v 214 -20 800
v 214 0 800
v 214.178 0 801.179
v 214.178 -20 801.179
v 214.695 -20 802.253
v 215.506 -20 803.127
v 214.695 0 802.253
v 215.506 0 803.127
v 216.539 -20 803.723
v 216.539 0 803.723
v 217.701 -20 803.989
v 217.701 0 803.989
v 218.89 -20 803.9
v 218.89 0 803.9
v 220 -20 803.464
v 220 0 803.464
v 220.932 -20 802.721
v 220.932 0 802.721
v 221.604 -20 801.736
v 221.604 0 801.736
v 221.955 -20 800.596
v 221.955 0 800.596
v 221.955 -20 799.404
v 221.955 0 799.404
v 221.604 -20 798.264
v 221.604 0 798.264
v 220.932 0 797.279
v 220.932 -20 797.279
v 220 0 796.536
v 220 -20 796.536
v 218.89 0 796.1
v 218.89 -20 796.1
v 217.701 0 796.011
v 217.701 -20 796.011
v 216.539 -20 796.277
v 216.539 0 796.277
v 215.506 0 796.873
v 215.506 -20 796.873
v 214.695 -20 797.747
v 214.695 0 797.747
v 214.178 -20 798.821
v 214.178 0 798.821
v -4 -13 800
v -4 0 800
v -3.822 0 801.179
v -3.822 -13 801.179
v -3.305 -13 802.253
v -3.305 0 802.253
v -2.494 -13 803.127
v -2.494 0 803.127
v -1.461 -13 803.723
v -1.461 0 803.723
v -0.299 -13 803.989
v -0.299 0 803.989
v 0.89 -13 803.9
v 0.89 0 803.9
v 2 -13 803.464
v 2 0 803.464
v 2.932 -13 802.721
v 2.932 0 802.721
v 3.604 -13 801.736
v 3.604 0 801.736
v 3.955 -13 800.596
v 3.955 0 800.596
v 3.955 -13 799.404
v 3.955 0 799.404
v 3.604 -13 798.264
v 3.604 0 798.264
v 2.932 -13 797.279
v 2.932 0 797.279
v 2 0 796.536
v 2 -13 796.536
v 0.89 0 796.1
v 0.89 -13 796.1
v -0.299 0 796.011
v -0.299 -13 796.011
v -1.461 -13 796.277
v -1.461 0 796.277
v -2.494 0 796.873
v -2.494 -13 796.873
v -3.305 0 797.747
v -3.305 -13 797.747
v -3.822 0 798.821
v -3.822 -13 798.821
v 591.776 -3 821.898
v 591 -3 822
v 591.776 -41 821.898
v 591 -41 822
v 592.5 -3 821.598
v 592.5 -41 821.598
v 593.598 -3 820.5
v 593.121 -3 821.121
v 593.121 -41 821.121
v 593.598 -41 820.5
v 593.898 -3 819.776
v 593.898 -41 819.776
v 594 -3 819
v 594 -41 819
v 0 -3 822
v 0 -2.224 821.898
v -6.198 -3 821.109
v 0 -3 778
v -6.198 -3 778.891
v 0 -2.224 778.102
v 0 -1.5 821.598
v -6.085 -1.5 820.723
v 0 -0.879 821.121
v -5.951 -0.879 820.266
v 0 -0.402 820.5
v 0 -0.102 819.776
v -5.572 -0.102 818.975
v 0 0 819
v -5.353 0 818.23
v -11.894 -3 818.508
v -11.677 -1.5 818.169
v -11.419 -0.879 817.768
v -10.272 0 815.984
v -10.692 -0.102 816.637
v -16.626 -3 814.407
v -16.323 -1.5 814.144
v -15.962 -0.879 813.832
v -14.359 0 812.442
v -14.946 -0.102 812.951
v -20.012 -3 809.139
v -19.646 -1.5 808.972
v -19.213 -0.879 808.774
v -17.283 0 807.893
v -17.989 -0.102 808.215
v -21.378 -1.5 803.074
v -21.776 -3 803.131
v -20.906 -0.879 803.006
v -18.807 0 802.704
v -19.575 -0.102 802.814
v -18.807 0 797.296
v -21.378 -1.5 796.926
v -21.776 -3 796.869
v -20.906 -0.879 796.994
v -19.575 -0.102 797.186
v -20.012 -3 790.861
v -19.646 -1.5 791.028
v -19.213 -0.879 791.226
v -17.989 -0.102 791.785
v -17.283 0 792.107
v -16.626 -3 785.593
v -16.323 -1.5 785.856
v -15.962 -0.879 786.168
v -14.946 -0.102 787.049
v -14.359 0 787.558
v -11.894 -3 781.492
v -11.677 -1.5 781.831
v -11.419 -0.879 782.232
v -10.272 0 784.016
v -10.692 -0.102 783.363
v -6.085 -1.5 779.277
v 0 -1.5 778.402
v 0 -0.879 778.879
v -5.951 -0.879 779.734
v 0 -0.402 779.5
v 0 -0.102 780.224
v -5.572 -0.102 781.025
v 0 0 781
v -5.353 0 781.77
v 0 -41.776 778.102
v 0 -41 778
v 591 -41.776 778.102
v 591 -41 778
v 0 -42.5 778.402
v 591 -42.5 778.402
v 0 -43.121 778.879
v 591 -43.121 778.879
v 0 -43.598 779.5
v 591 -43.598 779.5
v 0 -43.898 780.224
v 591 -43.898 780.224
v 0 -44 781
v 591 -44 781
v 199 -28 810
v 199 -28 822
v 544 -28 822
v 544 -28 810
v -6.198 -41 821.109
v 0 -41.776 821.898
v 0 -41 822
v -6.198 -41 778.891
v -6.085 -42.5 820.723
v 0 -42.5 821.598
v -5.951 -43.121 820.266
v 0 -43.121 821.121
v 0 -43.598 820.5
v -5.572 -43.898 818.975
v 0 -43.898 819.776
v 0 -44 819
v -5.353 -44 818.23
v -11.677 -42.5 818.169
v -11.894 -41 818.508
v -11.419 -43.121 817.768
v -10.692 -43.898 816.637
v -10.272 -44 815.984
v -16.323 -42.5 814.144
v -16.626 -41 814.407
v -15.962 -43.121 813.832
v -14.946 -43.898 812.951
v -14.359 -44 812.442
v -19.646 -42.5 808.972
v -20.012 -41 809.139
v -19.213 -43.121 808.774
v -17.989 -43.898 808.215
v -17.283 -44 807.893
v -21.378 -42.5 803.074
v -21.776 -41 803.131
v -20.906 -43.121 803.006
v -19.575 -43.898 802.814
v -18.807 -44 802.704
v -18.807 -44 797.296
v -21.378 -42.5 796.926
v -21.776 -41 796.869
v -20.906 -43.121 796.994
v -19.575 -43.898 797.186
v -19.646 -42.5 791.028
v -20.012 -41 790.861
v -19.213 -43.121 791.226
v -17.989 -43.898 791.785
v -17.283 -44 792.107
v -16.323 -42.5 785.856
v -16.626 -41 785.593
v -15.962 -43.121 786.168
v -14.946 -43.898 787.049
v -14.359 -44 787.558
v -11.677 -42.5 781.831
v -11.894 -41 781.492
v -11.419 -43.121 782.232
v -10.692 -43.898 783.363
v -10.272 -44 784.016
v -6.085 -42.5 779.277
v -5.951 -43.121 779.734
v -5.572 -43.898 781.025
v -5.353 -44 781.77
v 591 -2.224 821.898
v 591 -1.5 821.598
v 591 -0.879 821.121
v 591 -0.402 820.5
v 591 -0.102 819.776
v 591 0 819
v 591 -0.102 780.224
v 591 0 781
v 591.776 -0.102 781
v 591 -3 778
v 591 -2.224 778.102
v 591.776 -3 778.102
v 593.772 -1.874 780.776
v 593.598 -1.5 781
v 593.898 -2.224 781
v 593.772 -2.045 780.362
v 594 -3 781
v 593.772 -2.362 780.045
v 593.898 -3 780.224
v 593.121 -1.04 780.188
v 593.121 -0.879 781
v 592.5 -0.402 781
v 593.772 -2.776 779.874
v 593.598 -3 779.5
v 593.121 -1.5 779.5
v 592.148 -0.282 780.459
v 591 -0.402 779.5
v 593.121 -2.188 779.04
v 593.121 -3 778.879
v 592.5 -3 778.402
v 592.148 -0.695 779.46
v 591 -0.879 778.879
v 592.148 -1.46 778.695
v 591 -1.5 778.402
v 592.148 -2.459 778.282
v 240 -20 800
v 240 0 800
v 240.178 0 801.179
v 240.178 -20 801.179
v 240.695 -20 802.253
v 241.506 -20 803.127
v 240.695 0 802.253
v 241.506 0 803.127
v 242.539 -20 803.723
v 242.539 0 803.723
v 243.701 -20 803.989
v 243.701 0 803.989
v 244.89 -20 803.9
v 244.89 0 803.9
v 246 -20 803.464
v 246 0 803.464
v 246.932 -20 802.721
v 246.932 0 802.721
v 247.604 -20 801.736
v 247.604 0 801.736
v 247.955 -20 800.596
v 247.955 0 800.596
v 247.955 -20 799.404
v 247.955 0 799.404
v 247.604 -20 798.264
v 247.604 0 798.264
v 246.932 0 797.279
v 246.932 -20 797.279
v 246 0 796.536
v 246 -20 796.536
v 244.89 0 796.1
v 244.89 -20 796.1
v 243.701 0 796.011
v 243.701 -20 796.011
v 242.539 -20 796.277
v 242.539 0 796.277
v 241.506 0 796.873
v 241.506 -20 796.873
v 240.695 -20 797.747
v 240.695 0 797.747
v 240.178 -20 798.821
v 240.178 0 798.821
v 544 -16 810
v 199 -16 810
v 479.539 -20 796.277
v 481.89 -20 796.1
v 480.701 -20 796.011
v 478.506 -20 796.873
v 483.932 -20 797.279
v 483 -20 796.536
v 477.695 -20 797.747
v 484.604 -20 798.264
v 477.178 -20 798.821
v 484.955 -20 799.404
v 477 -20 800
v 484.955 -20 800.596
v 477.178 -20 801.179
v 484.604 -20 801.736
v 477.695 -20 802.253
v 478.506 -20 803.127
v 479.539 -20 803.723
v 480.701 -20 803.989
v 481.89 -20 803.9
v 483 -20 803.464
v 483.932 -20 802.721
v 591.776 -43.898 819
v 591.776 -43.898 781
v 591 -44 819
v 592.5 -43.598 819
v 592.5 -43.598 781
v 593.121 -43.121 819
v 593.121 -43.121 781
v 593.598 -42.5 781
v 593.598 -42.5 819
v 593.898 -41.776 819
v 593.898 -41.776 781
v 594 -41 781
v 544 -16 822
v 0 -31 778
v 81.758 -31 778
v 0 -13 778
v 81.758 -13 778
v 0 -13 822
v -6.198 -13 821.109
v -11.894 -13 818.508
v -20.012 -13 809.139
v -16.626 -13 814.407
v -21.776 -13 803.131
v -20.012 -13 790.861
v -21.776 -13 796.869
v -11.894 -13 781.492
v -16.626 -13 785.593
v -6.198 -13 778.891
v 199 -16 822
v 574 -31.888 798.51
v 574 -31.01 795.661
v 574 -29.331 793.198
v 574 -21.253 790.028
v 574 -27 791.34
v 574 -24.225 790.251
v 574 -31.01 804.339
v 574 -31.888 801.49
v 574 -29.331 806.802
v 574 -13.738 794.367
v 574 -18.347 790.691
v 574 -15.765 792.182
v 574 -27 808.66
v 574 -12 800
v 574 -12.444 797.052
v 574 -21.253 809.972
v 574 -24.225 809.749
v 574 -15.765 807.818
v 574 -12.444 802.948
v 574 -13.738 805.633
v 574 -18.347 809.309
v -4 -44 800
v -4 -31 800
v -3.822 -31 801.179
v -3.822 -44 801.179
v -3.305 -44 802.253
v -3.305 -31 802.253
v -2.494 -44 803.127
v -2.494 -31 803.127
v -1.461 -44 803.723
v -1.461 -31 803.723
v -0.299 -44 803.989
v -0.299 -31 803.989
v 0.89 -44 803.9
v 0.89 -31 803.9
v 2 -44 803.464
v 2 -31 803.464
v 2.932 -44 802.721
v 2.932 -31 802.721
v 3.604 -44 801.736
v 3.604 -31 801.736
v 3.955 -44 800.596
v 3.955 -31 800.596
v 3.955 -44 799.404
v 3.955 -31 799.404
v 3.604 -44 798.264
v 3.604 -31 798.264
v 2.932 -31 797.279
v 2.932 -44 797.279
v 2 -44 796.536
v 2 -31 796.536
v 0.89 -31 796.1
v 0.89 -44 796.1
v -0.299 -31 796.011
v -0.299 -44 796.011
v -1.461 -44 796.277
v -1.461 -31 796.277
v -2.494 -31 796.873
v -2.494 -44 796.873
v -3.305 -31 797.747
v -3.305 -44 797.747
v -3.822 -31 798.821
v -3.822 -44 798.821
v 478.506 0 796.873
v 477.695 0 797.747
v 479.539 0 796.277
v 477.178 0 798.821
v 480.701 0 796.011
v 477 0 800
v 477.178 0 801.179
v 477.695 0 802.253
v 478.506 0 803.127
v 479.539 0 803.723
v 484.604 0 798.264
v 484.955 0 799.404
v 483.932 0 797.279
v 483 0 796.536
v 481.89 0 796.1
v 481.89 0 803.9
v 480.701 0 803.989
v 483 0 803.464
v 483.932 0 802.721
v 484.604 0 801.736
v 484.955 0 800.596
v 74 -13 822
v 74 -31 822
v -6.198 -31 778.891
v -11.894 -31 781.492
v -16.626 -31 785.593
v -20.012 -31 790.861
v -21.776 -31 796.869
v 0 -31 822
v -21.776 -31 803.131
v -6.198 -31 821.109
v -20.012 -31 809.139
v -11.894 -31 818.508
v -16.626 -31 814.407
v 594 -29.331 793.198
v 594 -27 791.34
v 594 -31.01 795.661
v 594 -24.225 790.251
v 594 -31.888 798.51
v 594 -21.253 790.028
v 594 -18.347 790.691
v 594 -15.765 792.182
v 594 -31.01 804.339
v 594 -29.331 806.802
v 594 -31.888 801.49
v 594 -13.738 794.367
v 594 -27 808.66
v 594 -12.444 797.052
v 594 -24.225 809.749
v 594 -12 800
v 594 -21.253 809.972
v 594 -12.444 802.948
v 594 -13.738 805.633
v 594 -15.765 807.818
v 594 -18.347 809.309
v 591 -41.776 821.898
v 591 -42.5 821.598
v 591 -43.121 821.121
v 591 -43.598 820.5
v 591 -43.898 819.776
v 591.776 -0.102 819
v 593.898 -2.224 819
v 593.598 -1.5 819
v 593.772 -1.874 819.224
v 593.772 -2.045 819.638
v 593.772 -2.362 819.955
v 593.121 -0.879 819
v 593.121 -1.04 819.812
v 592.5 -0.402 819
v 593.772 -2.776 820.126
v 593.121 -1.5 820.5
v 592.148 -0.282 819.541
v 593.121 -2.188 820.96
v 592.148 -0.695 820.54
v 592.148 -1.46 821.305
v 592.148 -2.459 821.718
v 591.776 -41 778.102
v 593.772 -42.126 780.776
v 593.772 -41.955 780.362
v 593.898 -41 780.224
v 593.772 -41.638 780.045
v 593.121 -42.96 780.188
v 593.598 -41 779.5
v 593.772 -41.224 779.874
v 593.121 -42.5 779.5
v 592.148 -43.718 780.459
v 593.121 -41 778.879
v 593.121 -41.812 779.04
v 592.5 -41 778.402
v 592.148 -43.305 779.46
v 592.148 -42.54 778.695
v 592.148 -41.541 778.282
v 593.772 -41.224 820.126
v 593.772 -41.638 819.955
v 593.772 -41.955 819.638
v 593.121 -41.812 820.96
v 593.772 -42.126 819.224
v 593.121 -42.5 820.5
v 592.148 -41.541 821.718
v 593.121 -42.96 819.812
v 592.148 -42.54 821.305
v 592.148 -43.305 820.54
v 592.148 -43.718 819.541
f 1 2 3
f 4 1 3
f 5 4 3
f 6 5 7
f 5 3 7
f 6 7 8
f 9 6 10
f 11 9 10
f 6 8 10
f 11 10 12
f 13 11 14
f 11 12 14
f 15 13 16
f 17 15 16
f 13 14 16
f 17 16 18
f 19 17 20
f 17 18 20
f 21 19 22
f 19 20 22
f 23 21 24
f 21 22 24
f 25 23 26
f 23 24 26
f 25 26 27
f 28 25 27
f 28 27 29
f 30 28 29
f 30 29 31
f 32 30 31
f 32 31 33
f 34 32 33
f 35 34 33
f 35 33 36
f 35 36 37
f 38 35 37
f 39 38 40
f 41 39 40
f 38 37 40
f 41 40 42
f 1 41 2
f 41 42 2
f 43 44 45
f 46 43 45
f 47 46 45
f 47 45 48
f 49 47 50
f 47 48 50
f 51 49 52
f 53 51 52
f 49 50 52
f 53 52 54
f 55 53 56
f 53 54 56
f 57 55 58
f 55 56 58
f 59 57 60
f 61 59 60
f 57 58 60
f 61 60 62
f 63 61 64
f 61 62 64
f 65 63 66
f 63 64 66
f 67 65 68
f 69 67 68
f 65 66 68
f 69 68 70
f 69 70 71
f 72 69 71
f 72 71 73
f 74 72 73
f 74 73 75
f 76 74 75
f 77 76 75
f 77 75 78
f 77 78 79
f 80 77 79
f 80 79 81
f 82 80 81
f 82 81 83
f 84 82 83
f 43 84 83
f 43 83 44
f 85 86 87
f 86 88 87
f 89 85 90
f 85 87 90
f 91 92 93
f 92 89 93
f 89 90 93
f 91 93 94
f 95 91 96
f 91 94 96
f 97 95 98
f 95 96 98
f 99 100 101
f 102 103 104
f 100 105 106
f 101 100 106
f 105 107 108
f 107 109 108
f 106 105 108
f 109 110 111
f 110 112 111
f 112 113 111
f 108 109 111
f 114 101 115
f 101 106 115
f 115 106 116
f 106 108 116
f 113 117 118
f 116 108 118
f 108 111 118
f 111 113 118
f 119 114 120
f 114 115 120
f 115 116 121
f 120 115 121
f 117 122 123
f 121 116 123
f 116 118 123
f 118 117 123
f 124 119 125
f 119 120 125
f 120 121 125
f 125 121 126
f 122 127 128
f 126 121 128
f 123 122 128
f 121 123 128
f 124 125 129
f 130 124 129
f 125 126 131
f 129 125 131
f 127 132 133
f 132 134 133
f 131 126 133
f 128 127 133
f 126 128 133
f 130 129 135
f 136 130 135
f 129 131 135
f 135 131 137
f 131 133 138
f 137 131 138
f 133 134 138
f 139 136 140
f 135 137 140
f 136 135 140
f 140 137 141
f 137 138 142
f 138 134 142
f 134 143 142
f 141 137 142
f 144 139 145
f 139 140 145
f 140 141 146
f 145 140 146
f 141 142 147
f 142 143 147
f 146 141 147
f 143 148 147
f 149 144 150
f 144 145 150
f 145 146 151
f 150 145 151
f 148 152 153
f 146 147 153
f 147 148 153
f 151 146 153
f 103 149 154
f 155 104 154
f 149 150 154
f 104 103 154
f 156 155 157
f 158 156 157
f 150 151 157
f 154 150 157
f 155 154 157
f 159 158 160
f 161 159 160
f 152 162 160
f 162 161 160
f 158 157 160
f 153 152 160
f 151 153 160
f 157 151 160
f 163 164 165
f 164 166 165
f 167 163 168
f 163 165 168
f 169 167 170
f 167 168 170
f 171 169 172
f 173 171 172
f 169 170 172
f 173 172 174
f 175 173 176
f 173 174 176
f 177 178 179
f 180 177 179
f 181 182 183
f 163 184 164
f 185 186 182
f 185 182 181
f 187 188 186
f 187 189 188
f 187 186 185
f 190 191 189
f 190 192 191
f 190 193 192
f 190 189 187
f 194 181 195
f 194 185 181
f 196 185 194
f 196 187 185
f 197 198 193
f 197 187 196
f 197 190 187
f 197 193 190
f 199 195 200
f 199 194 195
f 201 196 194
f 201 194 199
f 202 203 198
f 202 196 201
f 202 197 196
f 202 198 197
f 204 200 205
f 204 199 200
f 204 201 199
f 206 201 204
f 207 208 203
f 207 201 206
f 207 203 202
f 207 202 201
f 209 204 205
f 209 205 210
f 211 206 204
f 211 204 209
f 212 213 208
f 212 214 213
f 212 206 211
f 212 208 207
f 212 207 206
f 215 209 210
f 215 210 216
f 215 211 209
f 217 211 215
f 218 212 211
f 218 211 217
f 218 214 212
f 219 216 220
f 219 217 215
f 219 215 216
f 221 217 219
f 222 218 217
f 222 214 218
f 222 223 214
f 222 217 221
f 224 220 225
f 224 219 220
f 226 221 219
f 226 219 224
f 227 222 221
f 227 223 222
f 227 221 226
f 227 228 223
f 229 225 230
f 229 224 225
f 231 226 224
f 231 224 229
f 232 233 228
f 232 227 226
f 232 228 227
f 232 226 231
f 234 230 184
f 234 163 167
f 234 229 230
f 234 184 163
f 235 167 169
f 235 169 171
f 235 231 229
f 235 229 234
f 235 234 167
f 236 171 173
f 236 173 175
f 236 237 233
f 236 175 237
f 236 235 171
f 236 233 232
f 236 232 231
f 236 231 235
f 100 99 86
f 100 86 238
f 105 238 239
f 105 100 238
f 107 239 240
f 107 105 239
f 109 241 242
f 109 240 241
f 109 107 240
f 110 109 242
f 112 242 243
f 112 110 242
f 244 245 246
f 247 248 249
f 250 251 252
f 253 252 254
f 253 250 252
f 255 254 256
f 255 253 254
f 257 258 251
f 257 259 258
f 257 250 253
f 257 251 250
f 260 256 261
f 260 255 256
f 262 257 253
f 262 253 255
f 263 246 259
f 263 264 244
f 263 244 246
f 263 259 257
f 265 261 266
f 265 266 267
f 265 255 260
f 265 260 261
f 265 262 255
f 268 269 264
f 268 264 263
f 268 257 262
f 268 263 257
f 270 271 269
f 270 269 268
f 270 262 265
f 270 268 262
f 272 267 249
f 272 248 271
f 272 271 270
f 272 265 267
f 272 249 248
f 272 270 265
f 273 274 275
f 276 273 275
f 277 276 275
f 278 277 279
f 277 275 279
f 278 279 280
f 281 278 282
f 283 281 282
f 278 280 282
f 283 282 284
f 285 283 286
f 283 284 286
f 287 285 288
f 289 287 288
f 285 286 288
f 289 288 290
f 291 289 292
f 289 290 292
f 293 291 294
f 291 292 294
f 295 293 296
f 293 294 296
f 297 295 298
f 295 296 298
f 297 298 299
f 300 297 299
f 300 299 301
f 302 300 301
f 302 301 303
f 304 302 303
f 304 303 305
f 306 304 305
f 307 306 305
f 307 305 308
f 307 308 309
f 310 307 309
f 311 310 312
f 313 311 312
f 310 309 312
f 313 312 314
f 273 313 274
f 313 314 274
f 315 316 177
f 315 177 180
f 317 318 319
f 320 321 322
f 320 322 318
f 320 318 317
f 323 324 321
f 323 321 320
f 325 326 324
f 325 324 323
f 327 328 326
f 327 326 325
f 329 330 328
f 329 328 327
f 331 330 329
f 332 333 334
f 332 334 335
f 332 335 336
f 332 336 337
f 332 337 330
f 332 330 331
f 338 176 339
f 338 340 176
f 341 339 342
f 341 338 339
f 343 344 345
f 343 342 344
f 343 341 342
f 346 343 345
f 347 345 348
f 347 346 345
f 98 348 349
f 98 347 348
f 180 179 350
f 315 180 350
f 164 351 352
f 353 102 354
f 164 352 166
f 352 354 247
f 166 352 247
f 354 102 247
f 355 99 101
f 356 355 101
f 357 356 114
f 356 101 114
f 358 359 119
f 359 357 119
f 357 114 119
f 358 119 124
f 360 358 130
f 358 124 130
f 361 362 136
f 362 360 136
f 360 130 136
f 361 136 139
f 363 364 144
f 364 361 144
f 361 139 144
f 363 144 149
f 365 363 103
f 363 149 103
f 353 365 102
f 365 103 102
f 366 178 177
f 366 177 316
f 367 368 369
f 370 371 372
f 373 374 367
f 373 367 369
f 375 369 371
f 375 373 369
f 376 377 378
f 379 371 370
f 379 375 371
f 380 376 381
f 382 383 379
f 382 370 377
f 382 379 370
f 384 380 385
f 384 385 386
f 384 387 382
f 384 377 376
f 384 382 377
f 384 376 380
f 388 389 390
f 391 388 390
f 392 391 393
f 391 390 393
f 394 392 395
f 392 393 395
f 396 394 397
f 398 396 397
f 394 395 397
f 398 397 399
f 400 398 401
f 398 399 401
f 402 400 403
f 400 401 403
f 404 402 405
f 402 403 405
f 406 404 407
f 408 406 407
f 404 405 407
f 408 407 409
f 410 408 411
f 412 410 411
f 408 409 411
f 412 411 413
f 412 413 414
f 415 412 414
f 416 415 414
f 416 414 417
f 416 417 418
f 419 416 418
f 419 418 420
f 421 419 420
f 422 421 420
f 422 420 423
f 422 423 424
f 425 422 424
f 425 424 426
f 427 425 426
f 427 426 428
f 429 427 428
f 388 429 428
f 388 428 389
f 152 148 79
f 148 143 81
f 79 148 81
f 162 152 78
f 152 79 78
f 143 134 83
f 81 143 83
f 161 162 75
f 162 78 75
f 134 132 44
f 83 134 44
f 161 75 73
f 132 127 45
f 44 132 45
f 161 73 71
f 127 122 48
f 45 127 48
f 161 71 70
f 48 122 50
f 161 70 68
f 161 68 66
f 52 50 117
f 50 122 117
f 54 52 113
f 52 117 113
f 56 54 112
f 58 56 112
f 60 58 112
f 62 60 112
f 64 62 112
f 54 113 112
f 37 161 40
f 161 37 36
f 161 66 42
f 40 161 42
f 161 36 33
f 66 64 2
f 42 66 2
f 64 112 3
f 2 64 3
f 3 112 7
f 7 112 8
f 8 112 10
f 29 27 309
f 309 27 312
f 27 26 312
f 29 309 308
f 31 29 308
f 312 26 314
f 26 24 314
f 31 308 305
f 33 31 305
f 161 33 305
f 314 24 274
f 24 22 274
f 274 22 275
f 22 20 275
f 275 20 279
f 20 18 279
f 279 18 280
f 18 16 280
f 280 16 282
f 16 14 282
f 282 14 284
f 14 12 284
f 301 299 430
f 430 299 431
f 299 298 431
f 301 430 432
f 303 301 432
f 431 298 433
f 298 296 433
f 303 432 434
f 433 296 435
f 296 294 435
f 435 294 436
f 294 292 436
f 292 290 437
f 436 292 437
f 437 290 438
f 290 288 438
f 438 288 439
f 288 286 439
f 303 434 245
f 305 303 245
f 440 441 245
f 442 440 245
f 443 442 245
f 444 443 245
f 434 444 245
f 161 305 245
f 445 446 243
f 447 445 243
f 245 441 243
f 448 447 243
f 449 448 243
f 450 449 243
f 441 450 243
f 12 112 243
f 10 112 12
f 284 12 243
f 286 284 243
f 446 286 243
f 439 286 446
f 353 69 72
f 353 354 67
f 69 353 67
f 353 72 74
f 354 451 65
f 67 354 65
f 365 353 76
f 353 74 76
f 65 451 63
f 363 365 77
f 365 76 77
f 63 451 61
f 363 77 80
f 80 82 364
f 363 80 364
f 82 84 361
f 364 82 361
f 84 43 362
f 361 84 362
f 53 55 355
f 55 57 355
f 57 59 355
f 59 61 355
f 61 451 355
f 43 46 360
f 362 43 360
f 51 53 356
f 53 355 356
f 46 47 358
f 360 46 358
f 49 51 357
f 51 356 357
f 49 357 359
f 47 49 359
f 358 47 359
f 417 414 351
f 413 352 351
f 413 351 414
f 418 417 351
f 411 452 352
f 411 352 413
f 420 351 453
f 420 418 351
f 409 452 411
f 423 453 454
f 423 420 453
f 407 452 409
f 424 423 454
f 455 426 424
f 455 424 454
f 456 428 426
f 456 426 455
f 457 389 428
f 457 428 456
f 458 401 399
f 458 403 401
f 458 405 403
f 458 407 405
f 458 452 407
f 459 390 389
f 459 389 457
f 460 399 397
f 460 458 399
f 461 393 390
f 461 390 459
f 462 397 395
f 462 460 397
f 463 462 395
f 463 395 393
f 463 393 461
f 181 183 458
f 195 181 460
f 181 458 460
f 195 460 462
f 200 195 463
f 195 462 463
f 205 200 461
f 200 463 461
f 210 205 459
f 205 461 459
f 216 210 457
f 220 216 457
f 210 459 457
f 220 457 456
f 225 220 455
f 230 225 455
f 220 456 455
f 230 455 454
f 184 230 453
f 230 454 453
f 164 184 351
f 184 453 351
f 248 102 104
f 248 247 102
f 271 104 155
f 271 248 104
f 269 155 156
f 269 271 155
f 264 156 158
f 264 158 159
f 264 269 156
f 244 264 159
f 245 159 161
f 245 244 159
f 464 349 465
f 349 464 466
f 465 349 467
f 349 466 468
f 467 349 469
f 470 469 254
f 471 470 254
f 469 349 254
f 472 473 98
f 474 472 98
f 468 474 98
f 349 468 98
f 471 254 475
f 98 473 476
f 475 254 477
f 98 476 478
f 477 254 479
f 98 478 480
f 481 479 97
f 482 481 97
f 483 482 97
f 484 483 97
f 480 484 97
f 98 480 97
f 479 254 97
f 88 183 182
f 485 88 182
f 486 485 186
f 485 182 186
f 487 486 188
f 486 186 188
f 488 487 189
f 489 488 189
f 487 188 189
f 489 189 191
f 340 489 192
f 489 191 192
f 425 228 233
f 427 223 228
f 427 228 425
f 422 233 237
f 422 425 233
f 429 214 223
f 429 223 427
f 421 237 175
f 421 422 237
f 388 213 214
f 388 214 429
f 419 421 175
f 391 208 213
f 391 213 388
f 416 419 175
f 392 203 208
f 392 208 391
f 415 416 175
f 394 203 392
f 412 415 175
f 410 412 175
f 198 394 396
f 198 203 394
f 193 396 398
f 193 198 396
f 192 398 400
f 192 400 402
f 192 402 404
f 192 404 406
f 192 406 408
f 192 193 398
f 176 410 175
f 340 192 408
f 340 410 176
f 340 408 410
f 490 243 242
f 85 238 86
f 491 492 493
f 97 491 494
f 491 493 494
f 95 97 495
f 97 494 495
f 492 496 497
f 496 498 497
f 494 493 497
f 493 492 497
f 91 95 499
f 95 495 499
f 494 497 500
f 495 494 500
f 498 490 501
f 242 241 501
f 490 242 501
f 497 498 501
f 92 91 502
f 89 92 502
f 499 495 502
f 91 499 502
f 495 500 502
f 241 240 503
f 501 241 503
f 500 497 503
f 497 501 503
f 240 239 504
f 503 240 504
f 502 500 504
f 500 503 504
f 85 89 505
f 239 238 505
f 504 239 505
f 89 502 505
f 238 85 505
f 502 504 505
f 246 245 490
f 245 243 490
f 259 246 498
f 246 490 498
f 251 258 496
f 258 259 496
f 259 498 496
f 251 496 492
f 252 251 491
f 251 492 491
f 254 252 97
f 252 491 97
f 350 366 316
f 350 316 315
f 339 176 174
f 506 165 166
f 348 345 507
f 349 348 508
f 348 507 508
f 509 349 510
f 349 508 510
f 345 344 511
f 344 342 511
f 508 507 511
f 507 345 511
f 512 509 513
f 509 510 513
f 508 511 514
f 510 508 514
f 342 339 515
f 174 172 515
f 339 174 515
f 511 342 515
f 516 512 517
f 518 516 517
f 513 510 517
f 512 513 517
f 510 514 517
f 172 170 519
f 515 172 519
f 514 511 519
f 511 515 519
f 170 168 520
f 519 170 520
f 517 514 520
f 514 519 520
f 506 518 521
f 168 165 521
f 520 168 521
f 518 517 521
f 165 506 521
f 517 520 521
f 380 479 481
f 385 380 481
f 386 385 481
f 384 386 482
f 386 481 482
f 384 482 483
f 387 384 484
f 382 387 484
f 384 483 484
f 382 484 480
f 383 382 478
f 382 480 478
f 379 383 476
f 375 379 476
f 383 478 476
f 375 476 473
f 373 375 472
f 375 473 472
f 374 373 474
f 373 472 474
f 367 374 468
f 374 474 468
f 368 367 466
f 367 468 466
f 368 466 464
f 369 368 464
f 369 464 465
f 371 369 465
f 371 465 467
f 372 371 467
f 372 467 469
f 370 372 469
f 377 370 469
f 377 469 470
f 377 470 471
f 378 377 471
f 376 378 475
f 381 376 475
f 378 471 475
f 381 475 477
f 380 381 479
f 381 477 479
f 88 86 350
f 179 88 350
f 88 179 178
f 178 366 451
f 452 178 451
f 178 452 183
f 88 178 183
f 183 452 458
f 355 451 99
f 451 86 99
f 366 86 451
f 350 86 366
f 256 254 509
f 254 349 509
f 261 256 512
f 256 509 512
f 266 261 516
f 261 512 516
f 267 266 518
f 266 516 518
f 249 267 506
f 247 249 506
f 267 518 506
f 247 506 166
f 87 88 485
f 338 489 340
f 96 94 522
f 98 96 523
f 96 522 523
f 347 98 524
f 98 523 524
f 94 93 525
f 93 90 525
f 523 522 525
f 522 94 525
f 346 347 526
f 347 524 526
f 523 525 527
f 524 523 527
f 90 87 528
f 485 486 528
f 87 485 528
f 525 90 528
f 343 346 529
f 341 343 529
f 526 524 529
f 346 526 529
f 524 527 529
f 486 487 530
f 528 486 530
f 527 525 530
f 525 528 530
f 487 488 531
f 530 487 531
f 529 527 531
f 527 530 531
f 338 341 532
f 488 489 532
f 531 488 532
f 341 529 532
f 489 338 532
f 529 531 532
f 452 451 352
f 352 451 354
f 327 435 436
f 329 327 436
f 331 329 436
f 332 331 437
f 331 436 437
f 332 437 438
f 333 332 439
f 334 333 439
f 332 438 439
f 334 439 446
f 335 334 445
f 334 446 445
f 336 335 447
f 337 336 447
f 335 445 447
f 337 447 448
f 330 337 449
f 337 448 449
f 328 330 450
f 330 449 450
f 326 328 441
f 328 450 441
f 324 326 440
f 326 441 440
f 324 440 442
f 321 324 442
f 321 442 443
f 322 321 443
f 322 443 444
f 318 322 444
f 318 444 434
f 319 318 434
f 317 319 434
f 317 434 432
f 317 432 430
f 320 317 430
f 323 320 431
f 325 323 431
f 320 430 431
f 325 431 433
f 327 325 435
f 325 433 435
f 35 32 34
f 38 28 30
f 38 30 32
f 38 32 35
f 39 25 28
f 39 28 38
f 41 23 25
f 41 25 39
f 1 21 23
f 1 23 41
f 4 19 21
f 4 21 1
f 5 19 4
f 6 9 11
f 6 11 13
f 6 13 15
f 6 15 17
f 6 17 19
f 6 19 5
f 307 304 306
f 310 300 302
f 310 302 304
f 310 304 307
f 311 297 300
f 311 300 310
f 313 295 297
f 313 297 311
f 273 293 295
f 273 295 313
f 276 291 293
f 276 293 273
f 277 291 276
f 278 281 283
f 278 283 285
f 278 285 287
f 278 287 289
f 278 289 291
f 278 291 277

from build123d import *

# Parameters (mm, degrees)
F1_DEPTH  = 44
F4_DEPTH  = 18
F5_R      = 4
F6_DEPTH  = 44.001
F7_DEPTH  = 20
F8_R      = 10
F9_DEPTH  = 20
F10_R     = 3
F11_W     = 345
F11_H     = 12
F12_DEPTH = 12


with BuildPart() as f1:
    # F0 (on Front) → F1 (new body)
    with BuildSketch(Plane.XZ):
        with BuildLine():
            Line((594, 822), (0, 822))
            ThreePointArc((0, 822), (-22, 800), (0, 778))
            Line((0, 778), (594, 778))
            Line((594, 778), (594, 822))
        make_face()
    extrude(amount=F1_DEPTH)

    # F3 (on offset) → F4 (cut)
    with BuildSketch(Plane(origin=(0, -13, 0), x_dir=(-1, 0, 0), z_dir=(0, 1, 0))):
        Polygon((-81.7583871512, 778), (22, 778), (22, 822), (-74, 822), align=None)
    extrude(amount=-F4_DEPTH, mode=Mode.SUBTRACT)

    # F5 (on face) → F6 (cut, through all)
    with BuildSketch(Plane(origin=(0, 0, 0), x_dir=(-1, 0, 0), z_dir=(0, 1, 0))):
        with Locations((0, 800)):
            Circle(F5_R)
    extrude(amount=-F6_DEPTH, mode=Mode.SUBTRACT)

    # F5 (on face) → F7 (cut)
    with BuildSketch(Plane(origin=(0, 0, 0), x_dir=(-1, 0, 0), z_dir=(0, 1, 0))):
        with Locations((-218, 800)):
            Circle(F5_R)
        with Locations((-244, 800)):
            Circle(F5_R)
        with Locations((-481, 800)):
            Circle(F5_R)
    extrude(amount=-F7_DEPTH, mode=Mode.SUBTRACT)

    # F8 (on face) → F9 (cut)
    with BuildSketch(Plane.YZ.offset(594)):
        with Locations((-22, 800)):
            Circle(F8_R)
    extrude(amount=-F9_DEPTH, mode=Mode.SUBTRACT)

    # F10
    f10_edges = [f1.edges().sort_by_distance(p)[0] for p in [
        (297, -44, 822),
        (297, 0, 822),
        (594, 0, 800),
        (594, -22, 822),
        (594, -44, 800),
        (594, -22, 778),
    ]]
    fillet(f10_edges, radius=F10_R)

    # F11 (on face) → F12 (cut)
    with BuildSketch(Plane.XY.offset(822)):
        with Locations((371.5, -22)):
            Rectangle(F11_W, F11_H)
    extrude(amount=-F12_DEPTH, mode=Mode.SUBTRACT)


solid = f1.part
